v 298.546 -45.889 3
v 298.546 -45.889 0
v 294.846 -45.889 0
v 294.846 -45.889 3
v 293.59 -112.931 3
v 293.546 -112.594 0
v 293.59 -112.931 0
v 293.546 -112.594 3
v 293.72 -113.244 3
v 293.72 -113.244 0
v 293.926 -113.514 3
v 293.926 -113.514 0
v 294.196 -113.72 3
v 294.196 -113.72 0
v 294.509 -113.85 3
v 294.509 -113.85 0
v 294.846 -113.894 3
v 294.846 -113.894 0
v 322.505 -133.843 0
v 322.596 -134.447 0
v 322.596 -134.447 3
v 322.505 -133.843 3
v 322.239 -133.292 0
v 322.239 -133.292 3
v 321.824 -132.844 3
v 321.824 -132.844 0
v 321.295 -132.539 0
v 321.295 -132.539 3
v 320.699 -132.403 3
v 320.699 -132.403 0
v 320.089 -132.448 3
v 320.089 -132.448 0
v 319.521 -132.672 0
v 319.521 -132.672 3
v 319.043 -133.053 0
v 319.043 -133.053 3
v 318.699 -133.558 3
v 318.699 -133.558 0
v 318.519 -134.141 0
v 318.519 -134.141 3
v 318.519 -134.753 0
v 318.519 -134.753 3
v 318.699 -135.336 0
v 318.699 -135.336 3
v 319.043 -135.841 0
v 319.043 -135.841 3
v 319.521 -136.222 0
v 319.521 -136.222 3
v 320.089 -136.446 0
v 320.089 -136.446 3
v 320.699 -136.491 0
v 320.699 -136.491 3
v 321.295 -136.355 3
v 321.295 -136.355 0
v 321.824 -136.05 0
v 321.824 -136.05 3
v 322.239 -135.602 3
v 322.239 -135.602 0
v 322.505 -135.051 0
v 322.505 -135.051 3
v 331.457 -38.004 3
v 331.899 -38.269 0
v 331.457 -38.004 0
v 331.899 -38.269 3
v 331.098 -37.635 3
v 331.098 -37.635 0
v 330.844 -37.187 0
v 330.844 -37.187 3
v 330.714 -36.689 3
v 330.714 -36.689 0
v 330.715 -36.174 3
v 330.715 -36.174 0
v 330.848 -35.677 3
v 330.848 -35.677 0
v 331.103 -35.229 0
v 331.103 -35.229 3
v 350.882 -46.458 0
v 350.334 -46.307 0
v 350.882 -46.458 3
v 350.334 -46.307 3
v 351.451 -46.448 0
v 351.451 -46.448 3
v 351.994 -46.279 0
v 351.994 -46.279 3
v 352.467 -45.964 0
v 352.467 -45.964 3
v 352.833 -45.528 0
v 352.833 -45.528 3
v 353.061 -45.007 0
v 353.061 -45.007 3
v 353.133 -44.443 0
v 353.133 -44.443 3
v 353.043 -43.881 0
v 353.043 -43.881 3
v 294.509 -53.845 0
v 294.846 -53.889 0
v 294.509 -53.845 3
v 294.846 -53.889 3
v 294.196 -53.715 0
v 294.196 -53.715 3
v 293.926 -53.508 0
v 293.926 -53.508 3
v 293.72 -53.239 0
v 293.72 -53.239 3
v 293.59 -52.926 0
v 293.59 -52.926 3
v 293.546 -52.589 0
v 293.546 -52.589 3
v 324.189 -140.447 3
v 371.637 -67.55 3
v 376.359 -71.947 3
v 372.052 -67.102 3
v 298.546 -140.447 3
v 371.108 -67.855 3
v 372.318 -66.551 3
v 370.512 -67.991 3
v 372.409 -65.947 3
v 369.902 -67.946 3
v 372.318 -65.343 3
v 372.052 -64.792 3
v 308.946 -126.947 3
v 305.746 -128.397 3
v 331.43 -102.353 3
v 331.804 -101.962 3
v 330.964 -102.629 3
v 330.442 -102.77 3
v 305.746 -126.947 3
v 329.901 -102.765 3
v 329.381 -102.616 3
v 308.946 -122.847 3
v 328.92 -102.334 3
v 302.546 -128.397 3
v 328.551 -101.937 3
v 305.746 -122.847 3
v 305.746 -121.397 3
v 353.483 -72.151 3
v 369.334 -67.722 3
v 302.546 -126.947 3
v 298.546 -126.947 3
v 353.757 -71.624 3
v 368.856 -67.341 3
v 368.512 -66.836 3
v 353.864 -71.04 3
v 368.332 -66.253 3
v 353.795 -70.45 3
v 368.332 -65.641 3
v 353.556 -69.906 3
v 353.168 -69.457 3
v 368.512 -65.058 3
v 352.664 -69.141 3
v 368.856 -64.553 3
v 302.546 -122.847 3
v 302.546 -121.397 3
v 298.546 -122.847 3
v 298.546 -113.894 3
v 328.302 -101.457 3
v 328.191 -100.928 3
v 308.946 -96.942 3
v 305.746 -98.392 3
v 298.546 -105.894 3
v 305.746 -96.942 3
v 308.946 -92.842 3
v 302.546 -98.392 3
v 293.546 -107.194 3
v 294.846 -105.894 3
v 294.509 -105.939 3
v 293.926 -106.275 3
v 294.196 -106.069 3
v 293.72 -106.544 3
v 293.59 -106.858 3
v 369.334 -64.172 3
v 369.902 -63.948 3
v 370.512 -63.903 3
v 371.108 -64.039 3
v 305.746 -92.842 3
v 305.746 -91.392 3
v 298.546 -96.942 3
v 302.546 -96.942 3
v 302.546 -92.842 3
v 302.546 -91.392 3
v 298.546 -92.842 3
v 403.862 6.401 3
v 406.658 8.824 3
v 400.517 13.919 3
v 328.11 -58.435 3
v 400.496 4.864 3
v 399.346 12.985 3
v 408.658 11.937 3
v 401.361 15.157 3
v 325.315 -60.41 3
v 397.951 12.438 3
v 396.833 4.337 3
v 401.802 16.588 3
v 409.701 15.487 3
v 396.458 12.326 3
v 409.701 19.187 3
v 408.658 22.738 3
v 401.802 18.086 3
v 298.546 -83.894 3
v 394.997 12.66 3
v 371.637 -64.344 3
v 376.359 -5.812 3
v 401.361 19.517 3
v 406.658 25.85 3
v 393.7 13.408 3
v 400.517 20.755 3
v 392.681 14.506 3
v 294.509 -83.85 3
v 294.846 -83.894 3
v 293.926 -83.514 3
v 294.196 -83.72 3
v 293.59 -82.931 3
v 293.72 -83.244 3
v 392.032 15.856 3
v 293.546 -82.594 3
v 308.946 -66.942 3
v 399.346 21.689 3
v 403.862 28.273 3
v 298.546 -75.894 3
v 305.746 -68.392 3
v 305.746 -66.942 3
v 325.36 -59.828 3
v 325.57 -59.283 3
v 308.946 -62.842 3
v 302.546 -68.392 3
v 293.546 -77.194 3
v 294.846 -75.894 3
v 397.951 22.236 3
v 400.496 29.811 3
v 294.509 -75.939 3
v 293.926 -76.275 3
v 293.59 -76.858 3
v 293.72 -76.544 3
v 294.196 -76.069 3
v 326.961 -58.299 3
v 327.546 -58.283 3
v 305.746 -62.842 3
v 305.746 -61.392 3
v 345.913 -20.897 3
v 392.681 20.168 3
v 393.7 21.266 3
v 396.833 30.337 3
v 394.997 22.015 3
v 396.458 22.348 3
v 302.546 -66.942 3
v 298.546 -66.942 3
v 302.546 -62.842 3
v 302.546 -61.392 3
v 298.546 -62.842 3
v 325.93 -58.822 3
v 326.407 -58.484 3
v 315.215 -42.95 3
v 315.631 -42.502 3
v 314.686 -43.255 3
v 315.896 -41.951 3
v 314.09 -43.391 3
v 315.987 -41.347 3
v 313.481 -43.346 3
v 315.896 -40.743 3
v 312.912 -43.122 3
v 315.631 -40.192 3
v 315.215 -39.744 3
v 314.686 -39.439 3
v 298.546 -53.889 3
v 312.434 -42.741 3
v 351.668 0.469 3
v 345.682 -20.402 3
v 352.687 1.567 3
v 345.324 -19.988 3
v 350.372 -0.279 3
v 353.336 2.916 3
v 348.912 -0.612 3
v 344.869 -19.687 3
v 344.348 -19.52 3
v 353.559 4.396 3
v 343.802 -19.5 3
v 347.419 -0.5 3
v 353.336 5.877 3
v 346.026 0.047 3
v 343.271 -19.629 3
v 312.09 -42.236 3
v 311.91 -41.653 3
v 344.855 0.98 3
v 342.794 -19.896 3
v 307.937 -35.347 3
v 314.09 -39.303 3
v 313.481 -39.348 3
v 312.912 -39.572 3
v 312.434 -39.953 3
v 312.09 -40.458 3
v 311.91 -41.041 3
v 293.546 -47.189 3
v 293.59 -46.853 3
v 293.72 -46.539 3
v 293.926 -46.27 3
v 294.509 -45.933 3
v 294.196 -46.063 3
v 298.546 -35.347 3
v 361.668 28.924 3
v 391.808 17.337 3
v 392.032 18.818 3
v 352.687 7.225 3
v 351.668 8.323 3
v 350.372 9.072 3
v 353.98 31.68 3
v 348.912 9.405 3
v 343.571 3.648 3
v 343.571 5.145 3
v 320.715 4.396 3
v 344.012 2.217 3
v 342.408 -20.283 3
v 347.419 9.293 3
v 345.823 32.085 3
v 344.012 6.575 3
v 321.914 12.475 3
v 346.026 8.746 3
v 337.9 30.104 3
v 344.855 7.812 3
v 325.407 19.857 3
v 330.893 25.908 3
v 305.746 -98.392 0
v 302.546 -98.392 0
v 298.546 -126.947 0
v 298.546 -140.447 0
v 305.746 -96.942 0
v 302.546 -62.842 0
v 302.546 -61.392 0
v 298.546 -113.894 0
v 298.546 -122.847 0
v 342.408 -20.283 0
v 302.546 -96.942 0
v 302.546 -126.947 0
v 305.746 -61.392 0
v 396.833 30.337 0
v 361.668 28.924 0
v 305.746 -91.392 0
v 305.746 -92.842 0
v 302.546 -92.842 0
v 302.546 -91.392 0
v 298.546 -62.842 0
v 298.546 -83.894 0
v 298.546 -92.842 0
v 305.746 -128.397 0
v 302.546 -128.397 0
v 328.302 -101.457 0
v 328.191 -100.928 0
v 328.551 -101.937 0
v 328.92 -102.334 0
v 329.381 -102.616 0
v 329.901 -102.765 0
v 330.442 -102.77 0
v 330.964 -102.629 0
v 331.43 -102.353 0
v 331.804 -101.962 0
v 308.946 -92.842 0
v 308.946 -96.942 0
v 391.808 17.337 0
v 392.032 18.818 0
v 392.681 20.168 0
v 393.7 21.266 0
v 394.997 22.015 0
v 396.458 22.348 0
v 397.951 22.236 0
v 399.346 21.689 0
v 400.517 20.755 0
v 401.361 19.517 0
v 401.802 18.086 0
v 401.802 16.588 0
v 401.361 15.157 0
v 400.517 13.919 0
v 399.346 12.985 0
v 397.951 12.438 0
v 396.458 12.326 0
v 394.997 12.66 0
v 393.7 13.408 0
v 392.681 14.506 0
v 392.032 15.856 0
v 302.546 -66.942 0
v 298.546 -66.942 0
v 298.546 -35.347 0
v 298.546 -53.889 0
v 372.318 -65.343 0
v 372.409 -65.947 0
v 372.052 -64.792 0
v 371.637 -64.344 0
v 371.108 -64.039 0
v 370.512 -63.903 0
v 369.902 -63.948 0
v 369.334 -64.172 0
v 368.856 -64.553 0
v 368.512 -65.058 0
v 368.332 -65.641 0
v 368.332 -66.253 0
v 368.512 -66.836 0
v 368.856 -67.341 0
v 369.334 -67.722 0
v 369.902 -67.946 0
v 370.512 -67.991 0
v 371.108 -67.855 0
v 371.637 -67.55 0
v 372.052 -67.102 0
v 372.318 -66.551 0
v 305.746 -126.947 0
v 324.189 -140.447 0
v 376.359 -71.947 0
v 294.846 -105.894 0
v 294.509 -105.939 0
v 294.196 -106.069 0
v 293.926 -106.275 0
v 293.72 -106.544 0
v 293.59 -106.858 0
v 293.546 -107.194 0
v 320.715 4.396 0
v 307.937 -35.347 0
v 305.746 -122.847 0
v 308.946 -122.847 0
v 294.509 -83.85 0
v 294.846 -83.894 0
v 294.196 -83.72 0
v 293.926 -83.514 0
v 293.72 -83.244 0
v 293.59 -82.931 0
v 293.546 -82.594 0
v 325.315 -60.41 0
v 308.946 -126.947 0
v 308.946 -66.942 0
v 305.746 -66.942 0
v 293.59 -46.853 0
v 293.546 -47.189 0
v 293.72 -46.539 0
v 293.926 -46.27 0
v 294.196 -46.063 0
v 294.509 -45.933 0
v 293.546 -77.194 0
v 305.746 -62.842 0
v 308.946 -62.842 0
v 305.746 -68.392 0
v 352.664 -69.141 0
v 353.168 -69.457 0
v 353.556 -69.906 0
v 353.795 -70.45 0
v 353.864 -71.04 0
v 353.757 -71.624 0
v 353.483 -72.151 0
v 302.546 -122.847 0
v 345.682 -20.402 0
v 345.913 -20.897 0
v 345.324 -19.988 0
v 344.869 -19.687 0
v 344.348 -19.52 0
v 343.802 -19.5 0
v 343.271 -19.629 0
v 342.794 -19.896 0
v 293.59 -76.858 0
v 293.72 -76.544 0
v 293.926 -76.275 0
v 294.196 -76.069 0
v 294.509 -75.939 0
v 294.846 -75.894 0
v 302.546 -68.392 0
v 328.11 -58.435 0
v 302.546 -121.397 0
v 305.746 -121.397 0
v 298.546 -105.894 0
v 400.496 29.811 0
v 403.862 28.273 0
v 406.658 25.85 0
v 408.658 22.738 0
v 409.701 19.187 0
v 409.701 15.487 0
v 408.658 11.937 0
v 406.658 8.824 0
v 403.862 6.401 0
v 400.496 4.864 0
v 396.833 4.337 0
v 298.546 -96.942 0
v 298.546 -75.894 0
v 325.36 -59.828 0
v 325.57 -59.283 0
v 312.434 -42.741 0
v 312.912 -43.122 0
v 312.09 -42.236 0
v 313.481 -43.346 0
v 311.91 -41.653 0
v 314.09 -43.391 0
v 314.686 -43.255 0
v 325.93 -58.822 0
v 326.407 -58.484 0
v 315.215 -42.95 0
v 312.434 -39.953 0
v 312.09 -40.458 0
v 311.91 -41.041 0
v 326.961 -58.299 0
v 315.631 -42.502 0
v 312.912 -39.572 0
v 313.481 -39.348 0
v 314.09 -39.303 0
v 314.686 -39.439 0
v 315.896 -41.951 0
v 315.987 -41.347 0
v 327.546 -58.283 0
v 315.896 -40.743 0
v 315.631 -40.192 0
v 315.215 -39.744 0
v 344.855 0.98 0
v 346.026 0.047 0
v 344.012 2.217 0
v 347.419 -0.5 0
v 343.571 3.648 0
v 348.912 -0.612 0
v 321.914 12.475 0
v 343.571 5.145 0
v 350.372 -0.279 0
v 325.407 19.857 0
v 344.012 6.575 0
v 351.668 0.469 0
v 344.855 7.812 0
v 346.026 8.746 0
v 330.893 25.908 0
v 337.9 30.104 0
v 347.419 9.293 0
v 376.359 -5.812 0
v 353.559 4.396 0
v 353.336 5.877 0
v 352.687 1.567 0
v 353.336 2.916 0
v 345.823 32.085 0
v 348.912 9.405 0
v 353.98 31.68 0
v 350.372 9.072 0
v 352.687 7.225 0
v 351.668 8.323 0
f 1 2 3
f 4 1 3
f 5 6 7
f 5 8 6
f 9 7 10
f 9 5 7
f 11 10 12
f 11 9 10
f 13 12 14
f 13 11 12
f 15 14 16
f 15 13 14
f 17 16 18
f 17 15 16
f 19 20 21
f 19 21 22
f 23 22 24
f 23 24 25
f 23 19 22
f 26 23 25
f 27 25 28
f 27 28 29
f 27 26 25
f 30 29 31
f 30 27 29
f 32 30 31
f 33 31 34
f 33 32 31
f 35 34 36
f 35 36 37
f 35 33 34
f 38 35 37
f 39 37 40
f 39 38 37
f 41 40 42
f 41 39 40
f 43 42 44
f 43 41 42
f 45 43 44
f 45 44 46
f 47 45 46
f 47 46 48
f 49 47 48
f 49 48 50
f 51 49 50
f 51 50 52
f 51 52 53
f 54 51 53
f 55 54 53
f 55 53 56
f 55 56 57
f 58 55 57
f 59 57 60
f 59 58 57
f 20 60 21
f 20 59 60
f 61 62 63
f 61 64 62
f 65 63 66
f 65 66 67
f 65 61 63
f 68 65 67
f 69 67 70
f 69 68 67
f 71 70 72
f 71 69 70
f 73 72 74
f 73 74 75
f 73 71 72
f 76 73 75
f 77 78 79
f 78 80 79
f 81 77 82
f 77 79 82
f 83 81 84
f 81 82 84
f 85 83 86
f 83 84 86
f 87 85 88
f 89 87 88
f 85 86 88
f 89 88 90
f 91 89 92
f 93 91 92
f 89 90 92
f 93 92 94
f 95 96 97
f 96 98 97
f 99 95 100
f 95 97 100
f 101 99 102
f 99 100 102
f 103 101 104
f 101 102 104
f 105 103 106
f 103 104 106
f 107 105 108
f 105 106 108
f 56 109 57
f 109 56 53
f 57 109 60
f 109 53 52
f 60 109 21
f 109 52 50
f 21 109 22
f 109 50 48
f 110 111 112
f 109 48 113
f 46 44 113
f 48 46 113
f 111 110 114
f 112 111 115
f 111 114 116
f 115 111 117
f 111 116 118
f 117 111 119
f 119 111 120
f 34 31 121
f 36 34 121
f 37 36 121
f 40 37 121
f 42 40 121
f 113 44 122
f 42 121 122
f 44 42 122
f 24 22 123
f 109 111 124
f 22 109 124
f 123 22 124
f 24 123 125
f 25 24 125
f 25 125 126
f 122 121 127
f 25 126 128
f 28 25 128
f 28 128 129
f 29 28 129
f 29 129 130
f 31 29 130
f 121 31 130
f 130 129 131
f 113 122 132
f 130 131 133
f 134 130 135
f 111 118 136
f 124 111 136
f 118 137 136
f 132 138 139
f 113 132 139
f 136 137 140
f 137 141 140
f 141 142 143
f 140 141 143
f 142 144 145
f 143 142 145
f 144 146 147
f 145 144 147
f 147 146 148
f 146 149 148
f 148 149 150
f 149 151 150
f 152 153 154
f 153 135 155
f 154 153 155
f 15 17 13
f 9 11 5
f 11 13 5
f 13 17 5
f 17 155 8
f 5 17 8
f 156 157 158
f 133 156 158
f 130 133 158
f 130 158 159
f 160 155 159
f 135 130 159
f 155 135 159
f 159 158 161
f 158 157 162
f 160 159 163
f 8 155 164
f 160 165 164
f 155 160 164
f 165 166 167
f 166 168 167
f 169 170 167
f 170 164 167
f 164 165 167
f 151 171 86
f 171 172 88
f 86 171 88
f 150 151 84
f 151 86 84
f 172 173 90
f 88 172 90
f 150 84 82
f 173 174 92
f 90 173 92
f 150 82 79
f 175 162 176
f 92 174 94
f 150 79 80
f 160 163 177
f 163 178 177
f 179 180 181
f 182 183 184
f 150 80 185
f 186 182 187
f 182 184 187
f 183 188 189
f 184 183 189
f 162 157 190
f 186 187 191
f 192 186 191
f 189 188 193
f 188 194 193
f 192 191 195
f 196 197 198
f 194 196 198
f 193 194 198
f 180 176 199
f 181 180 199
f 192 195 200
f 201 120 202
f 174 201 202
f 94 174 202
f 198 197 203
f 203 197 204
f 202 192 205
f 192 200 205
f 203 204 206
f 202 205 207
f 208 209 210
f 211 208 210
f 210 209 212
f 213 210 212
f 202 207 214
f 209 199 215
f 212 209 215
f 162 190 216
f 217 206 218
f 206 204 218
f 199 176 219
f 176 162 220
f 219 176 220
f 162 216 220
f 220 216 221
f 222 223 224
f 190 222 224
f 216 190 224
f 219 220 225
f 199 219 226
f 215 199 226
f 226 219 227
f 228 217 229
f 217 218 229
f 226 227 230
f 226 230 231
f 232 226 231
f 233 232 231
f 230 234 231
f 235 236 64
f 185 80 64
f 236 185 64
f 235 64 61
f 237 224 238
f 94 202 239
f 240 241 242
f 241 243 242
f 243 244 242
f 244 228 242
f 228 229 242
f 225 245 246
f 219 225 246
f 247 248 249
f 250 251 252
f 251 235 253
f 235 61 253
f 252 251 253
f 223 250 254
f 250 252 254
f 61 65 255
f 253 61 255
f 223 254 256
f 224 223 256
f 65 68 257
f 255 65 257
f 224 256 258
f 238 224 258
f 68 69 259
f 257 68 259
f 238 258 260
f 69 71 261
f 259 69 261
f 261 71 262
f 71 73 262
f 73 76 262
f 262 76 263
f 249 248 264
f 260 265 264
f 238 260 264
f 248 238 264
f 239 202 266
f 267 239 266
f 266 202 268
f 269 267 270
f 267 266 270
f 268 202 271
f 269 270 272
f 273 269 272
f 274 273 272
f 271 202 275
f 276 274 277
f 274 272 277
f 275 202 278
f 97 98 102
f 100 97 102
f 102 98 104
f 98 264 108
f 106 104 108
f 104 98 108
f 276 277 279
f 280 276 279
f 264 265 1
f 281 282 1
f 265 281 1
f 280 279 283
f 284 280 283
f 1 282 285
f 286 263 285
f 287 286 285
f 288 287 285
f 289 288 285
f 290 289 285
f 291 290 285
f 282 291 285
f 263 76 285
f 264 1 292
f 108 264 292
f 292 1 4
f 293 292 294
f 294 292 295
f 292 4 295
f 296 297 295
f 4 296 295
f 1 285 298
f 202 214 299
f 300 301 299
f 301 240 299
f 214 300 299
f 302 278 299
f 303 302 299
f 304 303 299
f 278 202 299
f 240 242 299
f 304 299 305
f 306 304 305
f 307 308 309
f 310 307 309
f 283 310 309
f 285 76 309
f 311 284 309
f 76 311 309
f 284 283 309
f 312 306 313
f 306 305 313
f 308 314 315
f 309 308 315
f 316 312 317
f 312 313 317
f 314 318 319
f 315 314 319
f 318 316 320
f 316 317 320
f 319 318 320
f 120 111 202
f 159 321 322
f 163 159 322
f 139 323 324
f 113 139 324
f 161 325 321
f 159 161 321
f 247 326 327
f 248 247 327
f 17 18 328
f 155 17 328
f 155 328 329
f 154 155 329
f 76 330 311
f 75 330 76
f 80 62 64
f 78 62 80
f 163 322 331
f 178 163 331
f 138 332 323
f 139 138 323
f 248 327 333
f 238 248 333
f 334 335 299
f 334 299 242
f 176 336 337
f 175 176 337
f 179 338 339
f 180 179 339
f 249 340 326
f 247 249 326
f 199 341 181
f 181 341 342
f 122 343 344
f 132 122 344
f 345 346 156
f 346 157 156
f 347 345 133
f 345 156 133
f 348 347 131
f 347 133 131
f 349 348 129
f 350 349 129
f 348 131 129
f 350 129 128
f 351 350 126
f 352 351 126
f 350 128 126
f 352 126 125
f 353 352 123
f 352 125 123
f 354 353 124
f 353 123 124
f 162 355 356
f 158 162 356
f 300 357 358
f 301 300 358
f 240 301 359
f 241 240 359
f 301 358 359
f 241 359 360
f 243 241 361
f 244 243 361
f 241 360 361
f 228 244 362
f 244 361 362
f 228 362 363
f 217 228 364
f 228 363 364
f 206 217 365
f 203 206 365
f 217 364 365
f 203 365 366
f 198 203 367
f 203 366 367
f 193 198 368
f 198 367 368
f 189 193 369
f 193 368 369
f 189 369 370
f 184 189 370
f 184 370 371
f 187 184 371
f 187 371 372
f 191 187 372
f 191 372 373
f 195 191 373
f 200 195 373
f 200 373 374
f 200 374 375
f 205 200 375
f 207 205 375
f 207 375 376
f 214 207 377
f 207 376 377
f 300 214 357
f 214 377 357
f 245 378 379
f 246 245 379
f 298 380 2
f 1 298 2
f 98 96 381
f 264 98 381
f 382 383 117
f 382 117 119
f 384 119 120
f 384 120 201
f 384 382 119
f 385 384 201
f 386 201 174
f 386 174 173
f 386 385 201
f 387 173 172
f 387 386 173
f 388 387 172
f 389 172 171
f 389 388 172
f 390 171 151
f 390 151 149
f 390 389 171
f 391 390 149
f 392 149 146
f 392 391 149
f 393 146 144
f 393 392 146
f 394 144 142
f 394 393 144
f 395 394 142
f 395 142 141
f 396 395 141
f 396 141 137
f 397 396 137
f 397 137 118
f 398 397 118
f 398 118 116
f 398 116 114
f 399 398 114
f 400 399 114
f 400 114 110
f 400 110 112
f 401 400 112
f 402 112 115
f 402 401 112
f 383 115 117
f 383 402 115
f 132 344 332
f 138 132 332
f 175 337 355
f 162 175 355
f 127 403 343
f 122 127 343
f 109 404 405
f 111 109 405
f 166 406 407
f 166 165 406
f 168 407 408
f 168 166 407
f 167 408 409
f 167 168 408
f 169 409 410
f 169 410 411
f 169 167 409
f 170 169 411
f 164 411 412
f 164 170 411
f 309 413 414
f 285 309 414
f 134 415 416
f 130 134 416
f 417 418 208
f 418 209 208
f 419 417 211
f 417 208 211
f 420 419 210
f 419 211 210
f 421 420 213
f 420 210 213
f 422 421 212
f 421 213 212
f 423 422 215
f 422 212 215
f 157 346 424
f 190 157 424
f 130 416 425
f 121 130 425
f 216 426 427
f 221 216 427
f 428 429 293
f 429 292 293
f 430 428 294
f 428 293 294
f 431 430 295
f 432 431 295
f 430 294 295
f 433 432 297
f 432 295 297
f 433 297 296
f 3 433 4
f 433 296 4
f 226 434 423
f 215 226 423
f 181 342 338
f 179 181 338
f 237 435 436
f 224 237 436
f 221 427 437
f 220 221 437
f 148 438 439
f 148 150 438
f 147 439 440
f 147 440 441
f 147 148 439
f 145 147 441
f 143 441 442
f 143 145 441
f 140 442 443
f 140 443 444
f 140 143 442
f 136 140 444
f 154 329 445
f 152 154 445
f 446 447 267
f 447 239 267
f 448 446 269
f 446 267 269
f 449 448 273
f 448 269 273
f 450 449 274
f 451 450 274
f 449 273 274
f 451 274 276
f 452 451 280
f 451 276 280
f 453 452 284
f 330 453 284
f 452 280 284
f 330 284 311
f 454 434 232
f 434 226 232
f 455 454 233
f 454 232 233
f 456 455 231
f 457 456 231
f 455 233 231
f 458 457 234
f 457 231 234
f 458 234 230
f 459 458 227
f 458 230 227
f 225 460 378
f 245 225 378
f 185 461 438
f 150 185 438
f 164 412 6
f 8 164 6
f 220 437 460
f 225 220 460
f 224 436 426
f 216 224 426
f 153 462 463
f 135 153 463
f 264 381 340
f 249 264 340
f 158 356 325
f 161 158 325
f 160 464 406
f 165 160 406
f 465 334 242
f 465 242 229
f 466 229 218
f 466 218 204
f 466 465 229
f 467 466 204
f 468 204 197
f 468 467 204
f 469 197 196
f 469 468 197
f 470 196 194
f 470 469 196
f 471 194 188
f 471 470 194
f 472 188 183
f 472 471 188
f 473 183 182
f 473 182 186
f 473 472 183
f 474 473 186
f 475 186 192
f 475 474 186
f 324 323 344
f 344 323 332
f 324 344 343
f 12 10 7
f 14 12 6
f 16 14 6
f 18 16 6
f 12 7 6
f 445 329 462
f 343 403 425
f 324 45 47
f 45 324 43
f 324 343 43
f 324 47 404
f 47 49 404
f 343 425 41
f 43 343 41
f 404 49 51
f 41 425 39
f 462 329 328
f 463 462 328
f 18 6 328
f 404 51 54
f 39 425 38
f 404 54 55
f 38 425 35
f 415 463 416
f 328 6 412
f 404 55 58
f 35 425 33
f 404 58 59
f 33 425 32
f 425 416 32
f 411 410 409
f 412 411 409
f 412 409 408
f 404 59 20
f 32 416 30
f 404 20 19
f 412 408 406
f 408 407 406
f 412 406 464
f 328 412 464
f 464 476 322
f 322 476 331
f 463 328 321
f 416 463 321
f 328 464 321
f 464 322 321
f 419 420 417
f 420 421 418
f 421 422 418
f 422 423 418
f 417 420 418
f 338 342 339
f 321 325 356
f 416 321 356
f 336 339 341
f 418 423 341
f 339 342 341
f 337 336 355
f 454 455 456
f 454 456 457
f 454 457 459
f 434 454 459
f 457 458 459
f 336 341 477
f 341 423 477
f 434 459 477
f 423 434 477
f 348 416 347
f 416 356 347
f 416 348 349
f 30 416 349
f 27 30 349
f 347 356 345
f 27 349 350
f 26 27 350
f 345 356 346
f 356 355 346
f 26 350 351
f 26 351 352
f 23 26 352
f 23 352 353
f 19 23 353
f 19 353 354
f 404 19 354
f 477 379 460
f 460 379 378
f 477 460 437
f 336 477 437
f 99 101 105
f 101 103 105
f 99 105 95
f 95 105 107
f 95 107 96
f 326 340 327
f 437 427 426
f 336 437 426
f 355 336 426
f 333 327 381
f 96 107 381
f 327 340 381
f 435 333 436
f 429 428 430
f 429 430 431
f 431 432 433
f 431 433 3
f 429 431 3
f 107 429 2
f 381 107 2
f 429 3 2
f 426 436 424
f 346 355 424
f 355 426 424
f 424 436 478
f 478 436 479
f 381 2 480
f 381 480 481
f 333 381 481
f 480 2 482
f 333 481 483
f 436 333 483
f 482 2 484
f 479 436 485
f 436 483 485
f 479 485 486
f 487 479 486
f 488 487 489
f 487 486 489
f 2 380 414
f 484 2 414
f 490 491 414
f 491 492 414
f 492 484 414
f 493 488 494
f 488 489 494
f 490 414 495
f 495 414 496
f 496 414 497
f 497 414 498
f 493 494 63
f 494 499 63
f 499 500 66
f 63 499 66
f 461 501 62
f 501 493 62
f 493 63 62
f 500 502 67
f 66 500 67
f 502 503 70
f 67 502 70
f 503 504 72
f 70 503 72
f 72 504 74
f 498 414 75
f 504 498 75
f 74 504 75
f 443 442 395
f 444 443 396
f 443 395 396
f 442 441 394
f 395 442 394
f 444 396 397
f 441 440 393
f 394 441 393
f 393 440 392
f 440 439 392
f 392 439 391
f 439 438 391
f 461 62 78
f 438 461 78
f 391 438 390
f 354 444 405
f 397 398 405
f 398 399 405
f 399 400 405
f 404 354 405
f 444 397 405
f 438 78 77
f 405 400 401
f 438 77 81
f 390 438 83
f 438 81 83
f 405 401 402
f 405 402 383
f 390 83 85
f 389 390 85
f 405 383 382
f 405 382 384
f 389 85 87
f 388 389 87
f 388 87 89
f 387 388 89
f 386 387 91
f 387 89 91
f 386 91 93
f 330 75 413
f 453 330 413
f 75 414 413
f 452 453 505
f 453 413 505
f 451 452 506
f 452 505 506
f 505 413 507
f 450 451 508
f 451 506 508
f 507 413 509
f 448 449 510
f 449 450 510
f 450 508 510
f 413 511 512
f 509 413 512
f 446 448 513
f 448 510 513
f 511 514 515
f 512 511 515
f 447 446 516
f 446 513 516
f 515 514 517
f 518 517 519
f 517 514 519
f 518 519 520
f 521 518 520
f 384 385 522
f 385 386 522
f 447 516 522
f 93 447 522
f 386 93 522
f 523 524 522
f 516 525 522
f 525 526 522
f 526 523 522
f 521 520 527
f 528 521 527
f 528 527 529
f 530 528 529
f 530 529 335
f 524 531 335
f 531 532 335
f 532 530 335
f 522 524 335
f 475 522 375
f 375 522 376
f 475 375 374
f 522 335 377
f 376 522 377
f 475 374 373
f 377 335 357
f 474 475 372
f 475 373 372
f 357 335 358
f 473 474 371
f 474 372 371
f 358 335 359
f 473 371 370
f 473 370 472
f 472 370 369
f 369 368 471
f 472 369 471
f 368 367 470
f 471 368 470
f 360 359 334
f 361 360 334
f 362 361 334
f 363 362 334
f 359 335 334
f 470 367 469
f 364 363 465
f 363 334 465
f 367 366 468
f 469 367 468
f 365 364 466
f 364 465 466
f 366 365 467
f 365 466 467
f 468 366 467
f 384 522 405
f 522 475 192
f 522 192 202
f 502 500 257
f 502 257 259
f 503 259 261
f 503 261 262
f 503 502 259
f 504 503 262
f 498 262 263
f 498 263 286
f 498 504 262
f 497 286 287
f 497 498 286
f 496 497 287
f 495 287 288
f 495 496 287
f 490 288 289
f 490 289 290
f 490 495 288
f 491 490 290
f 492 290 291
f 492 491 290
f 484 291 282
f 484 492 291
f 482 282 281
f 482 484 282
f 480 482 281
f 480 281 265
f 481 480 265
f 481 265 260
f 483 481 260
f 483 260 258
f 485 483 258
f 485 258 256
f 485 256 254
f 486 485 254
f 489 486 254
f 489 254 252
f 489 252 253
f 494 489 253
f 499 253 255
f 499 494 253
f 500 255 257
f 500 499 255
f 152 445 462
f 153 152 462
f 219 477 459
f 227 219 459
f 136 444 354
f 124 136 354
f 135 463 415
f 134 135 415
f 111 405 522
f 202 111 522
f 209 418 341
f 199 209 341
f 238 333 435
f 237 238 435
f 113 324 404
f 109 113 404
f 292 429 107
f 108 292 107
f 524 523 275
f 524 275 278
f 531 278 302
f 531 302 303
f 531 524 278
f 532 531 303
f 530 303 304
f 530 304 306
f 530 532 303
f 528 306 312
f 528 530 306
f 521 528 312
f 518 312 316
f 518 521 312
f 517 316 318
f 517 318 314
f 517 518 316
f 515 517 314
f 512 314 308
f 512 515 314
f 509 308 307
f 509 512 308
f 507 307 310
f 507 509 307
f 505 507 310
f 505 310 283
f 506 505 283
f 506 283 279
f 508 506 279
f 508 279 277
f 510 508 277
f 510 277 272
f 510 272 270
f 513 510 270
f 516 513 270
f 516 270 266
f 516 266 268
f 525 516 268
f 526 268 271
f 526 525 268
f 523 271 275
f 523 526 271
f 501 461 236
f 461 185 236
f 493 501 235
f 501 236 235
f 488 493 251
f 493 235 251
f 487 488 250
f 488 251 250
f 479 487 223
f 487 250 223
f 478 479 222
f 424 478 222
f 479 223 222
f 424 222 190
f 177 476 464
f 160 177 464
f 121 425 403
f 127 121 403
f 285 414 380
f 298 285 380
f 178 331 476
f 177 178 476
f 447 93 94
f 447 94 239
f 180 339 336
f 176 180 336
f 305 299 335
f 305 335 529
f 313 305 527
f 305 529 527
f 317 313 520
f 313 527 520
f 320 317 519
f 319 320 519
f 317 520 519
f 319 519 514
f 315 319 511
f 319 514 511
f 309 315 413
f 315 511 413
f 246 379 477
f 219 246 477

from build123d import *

# Parameters (mm, degrees)
SKETCH_1_R      = 5.0225
SKETCH_1_R_2    = 2.05
EXTRUDE_1_DEPTH = 3
FILLET_1_R      = 2
FILLET_2_R      = 1.3
SKETCH_3_R      = 5.025
EXTRUDE_2_DEPTH = 3


with BuildPart() as part:
    # 草图1 → 凸台-拉伸1 (new body)
    with BuildSketch(Plane.XY):
        with BuildLine():
            Line((298.545628784, -83.894391363), (298.545628784, -92.841778663))
            Line((298.545628784, -92.841778663), (302.545628784, -92.841778663))
            Line((302.545628784, -92.841778663), (302.545628784, -91.391778663))
            Line((302.545628784, -91.391778663), (305.745628784, -91.391778663))
            Line((305.745628784, -91.391778663), (305.745628784, -92.841778663))
            Line((305.745628784, -92.841778663), (308.945628784, -92.841778663))
            Line((308.945628784, -92.841778663), (308.945628784, -96.941778663))
            Line((308.945628784, -96.941778663), (305.745628784, -96.941778663))
            Line((305.745628784, -96.941778663), (305.745628784, -98.391778663))
            Line((305.745628784, -98.391778663), (302.545628784, -98.391778663))
            Line((302.545628784, -98.391778663), (302.545628784, -96.941778663))
            Line((302.545628784, -96.941778663), (298.545628784, -96.941778663))
            Line((298.545628784, -96.941778663), (298.545628784, -105.894391358))
            Line((298.545628784, -105.894391358), (293.545628784, -105.894391358))
            Line((293.545628784, -105.894391358), (293.545628784, -113.894391358))
            Line((293.545628784, -113.894391358), (298.545628784, -113.894391358))
            Line((298.545628784, -113.894391358), (298.545628784, -122.847004054))
            Line((298.545628784, -122.847004054), (302.545628784, -122.847004054))
            Line((302.545628784, -122.847004054), (302.545628784, -121.397004054))
            Line((302.545628784, -121.397004054), (305.745628784, -121.397004054))
            Line((305.745628784, -121.397004054), (305.745628784, -122.847004054))
            Line((305.745628784, -122.847004054), (308.945628784, -122.847004054))
            Line((308.945628784, -122.847004054), (308.945628784, -126.947004054))
            Line((308.945628784, -126.947004054), (305.745628784, -126.947004054))
            Line((305.745628784, -126.947004054), (305.745628784, -128.397004054))
            Line((305.745628784, -128.397004054), (302.545628784, -128.397004054))
            Line((302.545628784, -128.397004054), (302.545628784, -126.947004054))
            Line((302.545628784, -126.947004054), (298.545628784, -126.947004054))
            Line((298.545628784, -126.947004054), (298.545628784, -140.447004054))
            Line((298.545628784, -140.447004054), (324.188862368, -140.447004054))
            Line((324.188862368, -140.447004054), (376.358604426, -71.946984141))
            Line((376.358604426, -71.946984141), (376.358604426, 4.396201153))
            ThreePointArc((376.358604426, 4.396201153), (348.536987634, 32.217817945), (320.715370843, 4.396201153))
            Line((320.715370843, 4.396201153), (307.936987634, -35.346984141))
            Line((307.936987634, -35.346984141), (298.545628784, -35.346984141))
            Line((298.545628784, -35.346984141), (298.545628784, -45.889165972))
            Line((298.545628784, -45.889165972), (293.545628784, -45.889165972))
            Line((293.545628784, -45.889165972), (293.545628784, -53.889165972))
            Line((293.545628784, -53.889165972), (298.545628784, -53.889165972))
            Line((298.545628784, -53.889165972), (298.545628784, -62.841778668))
            Line((298.545628784, -62.841778668), (302.545628784, -62.841778668))
            Line((302.545628784, -62.841778668), (302.545628784, -61.391778668))
            Line((302.545628784, -61.391778668), (305.745628784, -61.391778668))
            Line((305.745628784, -61.391778668), (305.745628784, -62.841778668))
            Line((305.745628784, -62.841778668), (308.945628784, -62.841778668))
            Line((308.945628784, -62.841778668), (308.945628784, -66.941778668))
            Line((308.945628784, -66.941778668), (305.745628784, -66.941778668))
            Line((305.745628784, -66.941778668), (305.745628784, -68.391778668))
            Line((305.745628784, -68.391778668), (302.545628784, -68.391778668))
            Line((302.545628784, -68.391778668), (302.545628784, -66.941778668))
            Line((302.545628784, -66.941778668), (298.545628784, -66.941778668))
            Line((298.545628784, -66.941778668), (298.545628784, -75.894391363))
            Line((298.545628784, -75.894391363), (293.545628784, -75.894391363))
            Line((293.545628784, -75.894391363), (293.545628784, -83.894391363))
            Line((293.545628784, -83.894391363), (298.545628784, -83.894391363))
        make_face()
        with Locations((348.536987634, 4.396201153)):
            Circle(SKETCH_1_R, mode=Mode.SUBTRACT)
        with Locations((320.545628784, -134.447004054)):
            Circle(SKETCH_1_R_2, mode=Mode.SUBTRACT)
        with Locations((370.358604426, -65.946984141)):
            Circle(SKETCH_1_R_2, mode=Mode.SUBTRACT)
        with Locations((313.936987634, -41.346984141)):
            Circle(SKETCH_1_R_2, mode=Mode.SUBTRACT)
        Polygon((354.947285032, -70.136765586), (328.579617375, -106.396108383), (325.08144343, -57.115165973), align=None, mode=Mode.SUBTRACT)
        Polygon((329.571126451, -37.254352656), (354.337315751, -48.052488042), (344.758747766, -17.175445836), align=None, mode=Mode.SUBTRACT)
    extrude(amount=EXTRUDE_1_DEPTH)

    # 圆角1
    fillet_1_edges = [part.edges().sort_by_distance(p)[0] for p in [
        (354.947285032, -70.136765586, 1.5),
        (325.08144343, -57.115165973, 1.5),
        (328.579617375, -106.396108383, 1.5),
        (344.758747766, -17.175445836, 1.5),
        (329.571126451, -37.254352656, 1.5),
        (354.337315751, -48.052488042, 1.5),
    ]]
    fillet(fillet_1_edges, radius=FILLET_1_R)

    # 圆角2
    fillet_2_edges = [part.edges().sort_by_distance(p)[0] for p in [
        (293.545628784, -113.894391358, 1.5),
        (293.545628784, -105.894391358, 1.5),
        (293.545628784, -83.894391363, 1.5),
        (293.545628784, -75.894391363, 1.5),
        (293.545628784, -53.889165972, 1.5),
        (293.545628784, -45.889165972, 1.5),
    ]]
    fillet(fillet_2_edges, radius=FILLET_2_R)

    # 草图3 → 凸台-拉伸2 (add)
    with BuildSketch(Plane(origin=(0, 0, 0), x_dir=(-1, 0, 0), z_dir=(0, 0, -1))):
        with BuildLine():
            Line((-348.536987634, 28.396201153), (-396.833278949, 30.337153408))
            ThreePointArc((-396.833278949, 30.337153408), (-409.833278949, 17.337153408), (-396.833278949, 4.337153408))
            Line((-396.833278949, 4.337153408), (-348.536987634, -19.603798847))
            Line((-348.536987634, -19.603798847), (-372.536987634, 4.396201153))
            Line((-372.536987634, 4.396201153), (-348.536987634, 28.396201153))
        make_face()
        with Locations((-396.833278949, 17.337153408)):
            Circle(SKETCH_3_R, mode=Mode.SUBTRACT)
    extrude(amount=-EXTRUDE_2_DEPTH)


solid = part.part
